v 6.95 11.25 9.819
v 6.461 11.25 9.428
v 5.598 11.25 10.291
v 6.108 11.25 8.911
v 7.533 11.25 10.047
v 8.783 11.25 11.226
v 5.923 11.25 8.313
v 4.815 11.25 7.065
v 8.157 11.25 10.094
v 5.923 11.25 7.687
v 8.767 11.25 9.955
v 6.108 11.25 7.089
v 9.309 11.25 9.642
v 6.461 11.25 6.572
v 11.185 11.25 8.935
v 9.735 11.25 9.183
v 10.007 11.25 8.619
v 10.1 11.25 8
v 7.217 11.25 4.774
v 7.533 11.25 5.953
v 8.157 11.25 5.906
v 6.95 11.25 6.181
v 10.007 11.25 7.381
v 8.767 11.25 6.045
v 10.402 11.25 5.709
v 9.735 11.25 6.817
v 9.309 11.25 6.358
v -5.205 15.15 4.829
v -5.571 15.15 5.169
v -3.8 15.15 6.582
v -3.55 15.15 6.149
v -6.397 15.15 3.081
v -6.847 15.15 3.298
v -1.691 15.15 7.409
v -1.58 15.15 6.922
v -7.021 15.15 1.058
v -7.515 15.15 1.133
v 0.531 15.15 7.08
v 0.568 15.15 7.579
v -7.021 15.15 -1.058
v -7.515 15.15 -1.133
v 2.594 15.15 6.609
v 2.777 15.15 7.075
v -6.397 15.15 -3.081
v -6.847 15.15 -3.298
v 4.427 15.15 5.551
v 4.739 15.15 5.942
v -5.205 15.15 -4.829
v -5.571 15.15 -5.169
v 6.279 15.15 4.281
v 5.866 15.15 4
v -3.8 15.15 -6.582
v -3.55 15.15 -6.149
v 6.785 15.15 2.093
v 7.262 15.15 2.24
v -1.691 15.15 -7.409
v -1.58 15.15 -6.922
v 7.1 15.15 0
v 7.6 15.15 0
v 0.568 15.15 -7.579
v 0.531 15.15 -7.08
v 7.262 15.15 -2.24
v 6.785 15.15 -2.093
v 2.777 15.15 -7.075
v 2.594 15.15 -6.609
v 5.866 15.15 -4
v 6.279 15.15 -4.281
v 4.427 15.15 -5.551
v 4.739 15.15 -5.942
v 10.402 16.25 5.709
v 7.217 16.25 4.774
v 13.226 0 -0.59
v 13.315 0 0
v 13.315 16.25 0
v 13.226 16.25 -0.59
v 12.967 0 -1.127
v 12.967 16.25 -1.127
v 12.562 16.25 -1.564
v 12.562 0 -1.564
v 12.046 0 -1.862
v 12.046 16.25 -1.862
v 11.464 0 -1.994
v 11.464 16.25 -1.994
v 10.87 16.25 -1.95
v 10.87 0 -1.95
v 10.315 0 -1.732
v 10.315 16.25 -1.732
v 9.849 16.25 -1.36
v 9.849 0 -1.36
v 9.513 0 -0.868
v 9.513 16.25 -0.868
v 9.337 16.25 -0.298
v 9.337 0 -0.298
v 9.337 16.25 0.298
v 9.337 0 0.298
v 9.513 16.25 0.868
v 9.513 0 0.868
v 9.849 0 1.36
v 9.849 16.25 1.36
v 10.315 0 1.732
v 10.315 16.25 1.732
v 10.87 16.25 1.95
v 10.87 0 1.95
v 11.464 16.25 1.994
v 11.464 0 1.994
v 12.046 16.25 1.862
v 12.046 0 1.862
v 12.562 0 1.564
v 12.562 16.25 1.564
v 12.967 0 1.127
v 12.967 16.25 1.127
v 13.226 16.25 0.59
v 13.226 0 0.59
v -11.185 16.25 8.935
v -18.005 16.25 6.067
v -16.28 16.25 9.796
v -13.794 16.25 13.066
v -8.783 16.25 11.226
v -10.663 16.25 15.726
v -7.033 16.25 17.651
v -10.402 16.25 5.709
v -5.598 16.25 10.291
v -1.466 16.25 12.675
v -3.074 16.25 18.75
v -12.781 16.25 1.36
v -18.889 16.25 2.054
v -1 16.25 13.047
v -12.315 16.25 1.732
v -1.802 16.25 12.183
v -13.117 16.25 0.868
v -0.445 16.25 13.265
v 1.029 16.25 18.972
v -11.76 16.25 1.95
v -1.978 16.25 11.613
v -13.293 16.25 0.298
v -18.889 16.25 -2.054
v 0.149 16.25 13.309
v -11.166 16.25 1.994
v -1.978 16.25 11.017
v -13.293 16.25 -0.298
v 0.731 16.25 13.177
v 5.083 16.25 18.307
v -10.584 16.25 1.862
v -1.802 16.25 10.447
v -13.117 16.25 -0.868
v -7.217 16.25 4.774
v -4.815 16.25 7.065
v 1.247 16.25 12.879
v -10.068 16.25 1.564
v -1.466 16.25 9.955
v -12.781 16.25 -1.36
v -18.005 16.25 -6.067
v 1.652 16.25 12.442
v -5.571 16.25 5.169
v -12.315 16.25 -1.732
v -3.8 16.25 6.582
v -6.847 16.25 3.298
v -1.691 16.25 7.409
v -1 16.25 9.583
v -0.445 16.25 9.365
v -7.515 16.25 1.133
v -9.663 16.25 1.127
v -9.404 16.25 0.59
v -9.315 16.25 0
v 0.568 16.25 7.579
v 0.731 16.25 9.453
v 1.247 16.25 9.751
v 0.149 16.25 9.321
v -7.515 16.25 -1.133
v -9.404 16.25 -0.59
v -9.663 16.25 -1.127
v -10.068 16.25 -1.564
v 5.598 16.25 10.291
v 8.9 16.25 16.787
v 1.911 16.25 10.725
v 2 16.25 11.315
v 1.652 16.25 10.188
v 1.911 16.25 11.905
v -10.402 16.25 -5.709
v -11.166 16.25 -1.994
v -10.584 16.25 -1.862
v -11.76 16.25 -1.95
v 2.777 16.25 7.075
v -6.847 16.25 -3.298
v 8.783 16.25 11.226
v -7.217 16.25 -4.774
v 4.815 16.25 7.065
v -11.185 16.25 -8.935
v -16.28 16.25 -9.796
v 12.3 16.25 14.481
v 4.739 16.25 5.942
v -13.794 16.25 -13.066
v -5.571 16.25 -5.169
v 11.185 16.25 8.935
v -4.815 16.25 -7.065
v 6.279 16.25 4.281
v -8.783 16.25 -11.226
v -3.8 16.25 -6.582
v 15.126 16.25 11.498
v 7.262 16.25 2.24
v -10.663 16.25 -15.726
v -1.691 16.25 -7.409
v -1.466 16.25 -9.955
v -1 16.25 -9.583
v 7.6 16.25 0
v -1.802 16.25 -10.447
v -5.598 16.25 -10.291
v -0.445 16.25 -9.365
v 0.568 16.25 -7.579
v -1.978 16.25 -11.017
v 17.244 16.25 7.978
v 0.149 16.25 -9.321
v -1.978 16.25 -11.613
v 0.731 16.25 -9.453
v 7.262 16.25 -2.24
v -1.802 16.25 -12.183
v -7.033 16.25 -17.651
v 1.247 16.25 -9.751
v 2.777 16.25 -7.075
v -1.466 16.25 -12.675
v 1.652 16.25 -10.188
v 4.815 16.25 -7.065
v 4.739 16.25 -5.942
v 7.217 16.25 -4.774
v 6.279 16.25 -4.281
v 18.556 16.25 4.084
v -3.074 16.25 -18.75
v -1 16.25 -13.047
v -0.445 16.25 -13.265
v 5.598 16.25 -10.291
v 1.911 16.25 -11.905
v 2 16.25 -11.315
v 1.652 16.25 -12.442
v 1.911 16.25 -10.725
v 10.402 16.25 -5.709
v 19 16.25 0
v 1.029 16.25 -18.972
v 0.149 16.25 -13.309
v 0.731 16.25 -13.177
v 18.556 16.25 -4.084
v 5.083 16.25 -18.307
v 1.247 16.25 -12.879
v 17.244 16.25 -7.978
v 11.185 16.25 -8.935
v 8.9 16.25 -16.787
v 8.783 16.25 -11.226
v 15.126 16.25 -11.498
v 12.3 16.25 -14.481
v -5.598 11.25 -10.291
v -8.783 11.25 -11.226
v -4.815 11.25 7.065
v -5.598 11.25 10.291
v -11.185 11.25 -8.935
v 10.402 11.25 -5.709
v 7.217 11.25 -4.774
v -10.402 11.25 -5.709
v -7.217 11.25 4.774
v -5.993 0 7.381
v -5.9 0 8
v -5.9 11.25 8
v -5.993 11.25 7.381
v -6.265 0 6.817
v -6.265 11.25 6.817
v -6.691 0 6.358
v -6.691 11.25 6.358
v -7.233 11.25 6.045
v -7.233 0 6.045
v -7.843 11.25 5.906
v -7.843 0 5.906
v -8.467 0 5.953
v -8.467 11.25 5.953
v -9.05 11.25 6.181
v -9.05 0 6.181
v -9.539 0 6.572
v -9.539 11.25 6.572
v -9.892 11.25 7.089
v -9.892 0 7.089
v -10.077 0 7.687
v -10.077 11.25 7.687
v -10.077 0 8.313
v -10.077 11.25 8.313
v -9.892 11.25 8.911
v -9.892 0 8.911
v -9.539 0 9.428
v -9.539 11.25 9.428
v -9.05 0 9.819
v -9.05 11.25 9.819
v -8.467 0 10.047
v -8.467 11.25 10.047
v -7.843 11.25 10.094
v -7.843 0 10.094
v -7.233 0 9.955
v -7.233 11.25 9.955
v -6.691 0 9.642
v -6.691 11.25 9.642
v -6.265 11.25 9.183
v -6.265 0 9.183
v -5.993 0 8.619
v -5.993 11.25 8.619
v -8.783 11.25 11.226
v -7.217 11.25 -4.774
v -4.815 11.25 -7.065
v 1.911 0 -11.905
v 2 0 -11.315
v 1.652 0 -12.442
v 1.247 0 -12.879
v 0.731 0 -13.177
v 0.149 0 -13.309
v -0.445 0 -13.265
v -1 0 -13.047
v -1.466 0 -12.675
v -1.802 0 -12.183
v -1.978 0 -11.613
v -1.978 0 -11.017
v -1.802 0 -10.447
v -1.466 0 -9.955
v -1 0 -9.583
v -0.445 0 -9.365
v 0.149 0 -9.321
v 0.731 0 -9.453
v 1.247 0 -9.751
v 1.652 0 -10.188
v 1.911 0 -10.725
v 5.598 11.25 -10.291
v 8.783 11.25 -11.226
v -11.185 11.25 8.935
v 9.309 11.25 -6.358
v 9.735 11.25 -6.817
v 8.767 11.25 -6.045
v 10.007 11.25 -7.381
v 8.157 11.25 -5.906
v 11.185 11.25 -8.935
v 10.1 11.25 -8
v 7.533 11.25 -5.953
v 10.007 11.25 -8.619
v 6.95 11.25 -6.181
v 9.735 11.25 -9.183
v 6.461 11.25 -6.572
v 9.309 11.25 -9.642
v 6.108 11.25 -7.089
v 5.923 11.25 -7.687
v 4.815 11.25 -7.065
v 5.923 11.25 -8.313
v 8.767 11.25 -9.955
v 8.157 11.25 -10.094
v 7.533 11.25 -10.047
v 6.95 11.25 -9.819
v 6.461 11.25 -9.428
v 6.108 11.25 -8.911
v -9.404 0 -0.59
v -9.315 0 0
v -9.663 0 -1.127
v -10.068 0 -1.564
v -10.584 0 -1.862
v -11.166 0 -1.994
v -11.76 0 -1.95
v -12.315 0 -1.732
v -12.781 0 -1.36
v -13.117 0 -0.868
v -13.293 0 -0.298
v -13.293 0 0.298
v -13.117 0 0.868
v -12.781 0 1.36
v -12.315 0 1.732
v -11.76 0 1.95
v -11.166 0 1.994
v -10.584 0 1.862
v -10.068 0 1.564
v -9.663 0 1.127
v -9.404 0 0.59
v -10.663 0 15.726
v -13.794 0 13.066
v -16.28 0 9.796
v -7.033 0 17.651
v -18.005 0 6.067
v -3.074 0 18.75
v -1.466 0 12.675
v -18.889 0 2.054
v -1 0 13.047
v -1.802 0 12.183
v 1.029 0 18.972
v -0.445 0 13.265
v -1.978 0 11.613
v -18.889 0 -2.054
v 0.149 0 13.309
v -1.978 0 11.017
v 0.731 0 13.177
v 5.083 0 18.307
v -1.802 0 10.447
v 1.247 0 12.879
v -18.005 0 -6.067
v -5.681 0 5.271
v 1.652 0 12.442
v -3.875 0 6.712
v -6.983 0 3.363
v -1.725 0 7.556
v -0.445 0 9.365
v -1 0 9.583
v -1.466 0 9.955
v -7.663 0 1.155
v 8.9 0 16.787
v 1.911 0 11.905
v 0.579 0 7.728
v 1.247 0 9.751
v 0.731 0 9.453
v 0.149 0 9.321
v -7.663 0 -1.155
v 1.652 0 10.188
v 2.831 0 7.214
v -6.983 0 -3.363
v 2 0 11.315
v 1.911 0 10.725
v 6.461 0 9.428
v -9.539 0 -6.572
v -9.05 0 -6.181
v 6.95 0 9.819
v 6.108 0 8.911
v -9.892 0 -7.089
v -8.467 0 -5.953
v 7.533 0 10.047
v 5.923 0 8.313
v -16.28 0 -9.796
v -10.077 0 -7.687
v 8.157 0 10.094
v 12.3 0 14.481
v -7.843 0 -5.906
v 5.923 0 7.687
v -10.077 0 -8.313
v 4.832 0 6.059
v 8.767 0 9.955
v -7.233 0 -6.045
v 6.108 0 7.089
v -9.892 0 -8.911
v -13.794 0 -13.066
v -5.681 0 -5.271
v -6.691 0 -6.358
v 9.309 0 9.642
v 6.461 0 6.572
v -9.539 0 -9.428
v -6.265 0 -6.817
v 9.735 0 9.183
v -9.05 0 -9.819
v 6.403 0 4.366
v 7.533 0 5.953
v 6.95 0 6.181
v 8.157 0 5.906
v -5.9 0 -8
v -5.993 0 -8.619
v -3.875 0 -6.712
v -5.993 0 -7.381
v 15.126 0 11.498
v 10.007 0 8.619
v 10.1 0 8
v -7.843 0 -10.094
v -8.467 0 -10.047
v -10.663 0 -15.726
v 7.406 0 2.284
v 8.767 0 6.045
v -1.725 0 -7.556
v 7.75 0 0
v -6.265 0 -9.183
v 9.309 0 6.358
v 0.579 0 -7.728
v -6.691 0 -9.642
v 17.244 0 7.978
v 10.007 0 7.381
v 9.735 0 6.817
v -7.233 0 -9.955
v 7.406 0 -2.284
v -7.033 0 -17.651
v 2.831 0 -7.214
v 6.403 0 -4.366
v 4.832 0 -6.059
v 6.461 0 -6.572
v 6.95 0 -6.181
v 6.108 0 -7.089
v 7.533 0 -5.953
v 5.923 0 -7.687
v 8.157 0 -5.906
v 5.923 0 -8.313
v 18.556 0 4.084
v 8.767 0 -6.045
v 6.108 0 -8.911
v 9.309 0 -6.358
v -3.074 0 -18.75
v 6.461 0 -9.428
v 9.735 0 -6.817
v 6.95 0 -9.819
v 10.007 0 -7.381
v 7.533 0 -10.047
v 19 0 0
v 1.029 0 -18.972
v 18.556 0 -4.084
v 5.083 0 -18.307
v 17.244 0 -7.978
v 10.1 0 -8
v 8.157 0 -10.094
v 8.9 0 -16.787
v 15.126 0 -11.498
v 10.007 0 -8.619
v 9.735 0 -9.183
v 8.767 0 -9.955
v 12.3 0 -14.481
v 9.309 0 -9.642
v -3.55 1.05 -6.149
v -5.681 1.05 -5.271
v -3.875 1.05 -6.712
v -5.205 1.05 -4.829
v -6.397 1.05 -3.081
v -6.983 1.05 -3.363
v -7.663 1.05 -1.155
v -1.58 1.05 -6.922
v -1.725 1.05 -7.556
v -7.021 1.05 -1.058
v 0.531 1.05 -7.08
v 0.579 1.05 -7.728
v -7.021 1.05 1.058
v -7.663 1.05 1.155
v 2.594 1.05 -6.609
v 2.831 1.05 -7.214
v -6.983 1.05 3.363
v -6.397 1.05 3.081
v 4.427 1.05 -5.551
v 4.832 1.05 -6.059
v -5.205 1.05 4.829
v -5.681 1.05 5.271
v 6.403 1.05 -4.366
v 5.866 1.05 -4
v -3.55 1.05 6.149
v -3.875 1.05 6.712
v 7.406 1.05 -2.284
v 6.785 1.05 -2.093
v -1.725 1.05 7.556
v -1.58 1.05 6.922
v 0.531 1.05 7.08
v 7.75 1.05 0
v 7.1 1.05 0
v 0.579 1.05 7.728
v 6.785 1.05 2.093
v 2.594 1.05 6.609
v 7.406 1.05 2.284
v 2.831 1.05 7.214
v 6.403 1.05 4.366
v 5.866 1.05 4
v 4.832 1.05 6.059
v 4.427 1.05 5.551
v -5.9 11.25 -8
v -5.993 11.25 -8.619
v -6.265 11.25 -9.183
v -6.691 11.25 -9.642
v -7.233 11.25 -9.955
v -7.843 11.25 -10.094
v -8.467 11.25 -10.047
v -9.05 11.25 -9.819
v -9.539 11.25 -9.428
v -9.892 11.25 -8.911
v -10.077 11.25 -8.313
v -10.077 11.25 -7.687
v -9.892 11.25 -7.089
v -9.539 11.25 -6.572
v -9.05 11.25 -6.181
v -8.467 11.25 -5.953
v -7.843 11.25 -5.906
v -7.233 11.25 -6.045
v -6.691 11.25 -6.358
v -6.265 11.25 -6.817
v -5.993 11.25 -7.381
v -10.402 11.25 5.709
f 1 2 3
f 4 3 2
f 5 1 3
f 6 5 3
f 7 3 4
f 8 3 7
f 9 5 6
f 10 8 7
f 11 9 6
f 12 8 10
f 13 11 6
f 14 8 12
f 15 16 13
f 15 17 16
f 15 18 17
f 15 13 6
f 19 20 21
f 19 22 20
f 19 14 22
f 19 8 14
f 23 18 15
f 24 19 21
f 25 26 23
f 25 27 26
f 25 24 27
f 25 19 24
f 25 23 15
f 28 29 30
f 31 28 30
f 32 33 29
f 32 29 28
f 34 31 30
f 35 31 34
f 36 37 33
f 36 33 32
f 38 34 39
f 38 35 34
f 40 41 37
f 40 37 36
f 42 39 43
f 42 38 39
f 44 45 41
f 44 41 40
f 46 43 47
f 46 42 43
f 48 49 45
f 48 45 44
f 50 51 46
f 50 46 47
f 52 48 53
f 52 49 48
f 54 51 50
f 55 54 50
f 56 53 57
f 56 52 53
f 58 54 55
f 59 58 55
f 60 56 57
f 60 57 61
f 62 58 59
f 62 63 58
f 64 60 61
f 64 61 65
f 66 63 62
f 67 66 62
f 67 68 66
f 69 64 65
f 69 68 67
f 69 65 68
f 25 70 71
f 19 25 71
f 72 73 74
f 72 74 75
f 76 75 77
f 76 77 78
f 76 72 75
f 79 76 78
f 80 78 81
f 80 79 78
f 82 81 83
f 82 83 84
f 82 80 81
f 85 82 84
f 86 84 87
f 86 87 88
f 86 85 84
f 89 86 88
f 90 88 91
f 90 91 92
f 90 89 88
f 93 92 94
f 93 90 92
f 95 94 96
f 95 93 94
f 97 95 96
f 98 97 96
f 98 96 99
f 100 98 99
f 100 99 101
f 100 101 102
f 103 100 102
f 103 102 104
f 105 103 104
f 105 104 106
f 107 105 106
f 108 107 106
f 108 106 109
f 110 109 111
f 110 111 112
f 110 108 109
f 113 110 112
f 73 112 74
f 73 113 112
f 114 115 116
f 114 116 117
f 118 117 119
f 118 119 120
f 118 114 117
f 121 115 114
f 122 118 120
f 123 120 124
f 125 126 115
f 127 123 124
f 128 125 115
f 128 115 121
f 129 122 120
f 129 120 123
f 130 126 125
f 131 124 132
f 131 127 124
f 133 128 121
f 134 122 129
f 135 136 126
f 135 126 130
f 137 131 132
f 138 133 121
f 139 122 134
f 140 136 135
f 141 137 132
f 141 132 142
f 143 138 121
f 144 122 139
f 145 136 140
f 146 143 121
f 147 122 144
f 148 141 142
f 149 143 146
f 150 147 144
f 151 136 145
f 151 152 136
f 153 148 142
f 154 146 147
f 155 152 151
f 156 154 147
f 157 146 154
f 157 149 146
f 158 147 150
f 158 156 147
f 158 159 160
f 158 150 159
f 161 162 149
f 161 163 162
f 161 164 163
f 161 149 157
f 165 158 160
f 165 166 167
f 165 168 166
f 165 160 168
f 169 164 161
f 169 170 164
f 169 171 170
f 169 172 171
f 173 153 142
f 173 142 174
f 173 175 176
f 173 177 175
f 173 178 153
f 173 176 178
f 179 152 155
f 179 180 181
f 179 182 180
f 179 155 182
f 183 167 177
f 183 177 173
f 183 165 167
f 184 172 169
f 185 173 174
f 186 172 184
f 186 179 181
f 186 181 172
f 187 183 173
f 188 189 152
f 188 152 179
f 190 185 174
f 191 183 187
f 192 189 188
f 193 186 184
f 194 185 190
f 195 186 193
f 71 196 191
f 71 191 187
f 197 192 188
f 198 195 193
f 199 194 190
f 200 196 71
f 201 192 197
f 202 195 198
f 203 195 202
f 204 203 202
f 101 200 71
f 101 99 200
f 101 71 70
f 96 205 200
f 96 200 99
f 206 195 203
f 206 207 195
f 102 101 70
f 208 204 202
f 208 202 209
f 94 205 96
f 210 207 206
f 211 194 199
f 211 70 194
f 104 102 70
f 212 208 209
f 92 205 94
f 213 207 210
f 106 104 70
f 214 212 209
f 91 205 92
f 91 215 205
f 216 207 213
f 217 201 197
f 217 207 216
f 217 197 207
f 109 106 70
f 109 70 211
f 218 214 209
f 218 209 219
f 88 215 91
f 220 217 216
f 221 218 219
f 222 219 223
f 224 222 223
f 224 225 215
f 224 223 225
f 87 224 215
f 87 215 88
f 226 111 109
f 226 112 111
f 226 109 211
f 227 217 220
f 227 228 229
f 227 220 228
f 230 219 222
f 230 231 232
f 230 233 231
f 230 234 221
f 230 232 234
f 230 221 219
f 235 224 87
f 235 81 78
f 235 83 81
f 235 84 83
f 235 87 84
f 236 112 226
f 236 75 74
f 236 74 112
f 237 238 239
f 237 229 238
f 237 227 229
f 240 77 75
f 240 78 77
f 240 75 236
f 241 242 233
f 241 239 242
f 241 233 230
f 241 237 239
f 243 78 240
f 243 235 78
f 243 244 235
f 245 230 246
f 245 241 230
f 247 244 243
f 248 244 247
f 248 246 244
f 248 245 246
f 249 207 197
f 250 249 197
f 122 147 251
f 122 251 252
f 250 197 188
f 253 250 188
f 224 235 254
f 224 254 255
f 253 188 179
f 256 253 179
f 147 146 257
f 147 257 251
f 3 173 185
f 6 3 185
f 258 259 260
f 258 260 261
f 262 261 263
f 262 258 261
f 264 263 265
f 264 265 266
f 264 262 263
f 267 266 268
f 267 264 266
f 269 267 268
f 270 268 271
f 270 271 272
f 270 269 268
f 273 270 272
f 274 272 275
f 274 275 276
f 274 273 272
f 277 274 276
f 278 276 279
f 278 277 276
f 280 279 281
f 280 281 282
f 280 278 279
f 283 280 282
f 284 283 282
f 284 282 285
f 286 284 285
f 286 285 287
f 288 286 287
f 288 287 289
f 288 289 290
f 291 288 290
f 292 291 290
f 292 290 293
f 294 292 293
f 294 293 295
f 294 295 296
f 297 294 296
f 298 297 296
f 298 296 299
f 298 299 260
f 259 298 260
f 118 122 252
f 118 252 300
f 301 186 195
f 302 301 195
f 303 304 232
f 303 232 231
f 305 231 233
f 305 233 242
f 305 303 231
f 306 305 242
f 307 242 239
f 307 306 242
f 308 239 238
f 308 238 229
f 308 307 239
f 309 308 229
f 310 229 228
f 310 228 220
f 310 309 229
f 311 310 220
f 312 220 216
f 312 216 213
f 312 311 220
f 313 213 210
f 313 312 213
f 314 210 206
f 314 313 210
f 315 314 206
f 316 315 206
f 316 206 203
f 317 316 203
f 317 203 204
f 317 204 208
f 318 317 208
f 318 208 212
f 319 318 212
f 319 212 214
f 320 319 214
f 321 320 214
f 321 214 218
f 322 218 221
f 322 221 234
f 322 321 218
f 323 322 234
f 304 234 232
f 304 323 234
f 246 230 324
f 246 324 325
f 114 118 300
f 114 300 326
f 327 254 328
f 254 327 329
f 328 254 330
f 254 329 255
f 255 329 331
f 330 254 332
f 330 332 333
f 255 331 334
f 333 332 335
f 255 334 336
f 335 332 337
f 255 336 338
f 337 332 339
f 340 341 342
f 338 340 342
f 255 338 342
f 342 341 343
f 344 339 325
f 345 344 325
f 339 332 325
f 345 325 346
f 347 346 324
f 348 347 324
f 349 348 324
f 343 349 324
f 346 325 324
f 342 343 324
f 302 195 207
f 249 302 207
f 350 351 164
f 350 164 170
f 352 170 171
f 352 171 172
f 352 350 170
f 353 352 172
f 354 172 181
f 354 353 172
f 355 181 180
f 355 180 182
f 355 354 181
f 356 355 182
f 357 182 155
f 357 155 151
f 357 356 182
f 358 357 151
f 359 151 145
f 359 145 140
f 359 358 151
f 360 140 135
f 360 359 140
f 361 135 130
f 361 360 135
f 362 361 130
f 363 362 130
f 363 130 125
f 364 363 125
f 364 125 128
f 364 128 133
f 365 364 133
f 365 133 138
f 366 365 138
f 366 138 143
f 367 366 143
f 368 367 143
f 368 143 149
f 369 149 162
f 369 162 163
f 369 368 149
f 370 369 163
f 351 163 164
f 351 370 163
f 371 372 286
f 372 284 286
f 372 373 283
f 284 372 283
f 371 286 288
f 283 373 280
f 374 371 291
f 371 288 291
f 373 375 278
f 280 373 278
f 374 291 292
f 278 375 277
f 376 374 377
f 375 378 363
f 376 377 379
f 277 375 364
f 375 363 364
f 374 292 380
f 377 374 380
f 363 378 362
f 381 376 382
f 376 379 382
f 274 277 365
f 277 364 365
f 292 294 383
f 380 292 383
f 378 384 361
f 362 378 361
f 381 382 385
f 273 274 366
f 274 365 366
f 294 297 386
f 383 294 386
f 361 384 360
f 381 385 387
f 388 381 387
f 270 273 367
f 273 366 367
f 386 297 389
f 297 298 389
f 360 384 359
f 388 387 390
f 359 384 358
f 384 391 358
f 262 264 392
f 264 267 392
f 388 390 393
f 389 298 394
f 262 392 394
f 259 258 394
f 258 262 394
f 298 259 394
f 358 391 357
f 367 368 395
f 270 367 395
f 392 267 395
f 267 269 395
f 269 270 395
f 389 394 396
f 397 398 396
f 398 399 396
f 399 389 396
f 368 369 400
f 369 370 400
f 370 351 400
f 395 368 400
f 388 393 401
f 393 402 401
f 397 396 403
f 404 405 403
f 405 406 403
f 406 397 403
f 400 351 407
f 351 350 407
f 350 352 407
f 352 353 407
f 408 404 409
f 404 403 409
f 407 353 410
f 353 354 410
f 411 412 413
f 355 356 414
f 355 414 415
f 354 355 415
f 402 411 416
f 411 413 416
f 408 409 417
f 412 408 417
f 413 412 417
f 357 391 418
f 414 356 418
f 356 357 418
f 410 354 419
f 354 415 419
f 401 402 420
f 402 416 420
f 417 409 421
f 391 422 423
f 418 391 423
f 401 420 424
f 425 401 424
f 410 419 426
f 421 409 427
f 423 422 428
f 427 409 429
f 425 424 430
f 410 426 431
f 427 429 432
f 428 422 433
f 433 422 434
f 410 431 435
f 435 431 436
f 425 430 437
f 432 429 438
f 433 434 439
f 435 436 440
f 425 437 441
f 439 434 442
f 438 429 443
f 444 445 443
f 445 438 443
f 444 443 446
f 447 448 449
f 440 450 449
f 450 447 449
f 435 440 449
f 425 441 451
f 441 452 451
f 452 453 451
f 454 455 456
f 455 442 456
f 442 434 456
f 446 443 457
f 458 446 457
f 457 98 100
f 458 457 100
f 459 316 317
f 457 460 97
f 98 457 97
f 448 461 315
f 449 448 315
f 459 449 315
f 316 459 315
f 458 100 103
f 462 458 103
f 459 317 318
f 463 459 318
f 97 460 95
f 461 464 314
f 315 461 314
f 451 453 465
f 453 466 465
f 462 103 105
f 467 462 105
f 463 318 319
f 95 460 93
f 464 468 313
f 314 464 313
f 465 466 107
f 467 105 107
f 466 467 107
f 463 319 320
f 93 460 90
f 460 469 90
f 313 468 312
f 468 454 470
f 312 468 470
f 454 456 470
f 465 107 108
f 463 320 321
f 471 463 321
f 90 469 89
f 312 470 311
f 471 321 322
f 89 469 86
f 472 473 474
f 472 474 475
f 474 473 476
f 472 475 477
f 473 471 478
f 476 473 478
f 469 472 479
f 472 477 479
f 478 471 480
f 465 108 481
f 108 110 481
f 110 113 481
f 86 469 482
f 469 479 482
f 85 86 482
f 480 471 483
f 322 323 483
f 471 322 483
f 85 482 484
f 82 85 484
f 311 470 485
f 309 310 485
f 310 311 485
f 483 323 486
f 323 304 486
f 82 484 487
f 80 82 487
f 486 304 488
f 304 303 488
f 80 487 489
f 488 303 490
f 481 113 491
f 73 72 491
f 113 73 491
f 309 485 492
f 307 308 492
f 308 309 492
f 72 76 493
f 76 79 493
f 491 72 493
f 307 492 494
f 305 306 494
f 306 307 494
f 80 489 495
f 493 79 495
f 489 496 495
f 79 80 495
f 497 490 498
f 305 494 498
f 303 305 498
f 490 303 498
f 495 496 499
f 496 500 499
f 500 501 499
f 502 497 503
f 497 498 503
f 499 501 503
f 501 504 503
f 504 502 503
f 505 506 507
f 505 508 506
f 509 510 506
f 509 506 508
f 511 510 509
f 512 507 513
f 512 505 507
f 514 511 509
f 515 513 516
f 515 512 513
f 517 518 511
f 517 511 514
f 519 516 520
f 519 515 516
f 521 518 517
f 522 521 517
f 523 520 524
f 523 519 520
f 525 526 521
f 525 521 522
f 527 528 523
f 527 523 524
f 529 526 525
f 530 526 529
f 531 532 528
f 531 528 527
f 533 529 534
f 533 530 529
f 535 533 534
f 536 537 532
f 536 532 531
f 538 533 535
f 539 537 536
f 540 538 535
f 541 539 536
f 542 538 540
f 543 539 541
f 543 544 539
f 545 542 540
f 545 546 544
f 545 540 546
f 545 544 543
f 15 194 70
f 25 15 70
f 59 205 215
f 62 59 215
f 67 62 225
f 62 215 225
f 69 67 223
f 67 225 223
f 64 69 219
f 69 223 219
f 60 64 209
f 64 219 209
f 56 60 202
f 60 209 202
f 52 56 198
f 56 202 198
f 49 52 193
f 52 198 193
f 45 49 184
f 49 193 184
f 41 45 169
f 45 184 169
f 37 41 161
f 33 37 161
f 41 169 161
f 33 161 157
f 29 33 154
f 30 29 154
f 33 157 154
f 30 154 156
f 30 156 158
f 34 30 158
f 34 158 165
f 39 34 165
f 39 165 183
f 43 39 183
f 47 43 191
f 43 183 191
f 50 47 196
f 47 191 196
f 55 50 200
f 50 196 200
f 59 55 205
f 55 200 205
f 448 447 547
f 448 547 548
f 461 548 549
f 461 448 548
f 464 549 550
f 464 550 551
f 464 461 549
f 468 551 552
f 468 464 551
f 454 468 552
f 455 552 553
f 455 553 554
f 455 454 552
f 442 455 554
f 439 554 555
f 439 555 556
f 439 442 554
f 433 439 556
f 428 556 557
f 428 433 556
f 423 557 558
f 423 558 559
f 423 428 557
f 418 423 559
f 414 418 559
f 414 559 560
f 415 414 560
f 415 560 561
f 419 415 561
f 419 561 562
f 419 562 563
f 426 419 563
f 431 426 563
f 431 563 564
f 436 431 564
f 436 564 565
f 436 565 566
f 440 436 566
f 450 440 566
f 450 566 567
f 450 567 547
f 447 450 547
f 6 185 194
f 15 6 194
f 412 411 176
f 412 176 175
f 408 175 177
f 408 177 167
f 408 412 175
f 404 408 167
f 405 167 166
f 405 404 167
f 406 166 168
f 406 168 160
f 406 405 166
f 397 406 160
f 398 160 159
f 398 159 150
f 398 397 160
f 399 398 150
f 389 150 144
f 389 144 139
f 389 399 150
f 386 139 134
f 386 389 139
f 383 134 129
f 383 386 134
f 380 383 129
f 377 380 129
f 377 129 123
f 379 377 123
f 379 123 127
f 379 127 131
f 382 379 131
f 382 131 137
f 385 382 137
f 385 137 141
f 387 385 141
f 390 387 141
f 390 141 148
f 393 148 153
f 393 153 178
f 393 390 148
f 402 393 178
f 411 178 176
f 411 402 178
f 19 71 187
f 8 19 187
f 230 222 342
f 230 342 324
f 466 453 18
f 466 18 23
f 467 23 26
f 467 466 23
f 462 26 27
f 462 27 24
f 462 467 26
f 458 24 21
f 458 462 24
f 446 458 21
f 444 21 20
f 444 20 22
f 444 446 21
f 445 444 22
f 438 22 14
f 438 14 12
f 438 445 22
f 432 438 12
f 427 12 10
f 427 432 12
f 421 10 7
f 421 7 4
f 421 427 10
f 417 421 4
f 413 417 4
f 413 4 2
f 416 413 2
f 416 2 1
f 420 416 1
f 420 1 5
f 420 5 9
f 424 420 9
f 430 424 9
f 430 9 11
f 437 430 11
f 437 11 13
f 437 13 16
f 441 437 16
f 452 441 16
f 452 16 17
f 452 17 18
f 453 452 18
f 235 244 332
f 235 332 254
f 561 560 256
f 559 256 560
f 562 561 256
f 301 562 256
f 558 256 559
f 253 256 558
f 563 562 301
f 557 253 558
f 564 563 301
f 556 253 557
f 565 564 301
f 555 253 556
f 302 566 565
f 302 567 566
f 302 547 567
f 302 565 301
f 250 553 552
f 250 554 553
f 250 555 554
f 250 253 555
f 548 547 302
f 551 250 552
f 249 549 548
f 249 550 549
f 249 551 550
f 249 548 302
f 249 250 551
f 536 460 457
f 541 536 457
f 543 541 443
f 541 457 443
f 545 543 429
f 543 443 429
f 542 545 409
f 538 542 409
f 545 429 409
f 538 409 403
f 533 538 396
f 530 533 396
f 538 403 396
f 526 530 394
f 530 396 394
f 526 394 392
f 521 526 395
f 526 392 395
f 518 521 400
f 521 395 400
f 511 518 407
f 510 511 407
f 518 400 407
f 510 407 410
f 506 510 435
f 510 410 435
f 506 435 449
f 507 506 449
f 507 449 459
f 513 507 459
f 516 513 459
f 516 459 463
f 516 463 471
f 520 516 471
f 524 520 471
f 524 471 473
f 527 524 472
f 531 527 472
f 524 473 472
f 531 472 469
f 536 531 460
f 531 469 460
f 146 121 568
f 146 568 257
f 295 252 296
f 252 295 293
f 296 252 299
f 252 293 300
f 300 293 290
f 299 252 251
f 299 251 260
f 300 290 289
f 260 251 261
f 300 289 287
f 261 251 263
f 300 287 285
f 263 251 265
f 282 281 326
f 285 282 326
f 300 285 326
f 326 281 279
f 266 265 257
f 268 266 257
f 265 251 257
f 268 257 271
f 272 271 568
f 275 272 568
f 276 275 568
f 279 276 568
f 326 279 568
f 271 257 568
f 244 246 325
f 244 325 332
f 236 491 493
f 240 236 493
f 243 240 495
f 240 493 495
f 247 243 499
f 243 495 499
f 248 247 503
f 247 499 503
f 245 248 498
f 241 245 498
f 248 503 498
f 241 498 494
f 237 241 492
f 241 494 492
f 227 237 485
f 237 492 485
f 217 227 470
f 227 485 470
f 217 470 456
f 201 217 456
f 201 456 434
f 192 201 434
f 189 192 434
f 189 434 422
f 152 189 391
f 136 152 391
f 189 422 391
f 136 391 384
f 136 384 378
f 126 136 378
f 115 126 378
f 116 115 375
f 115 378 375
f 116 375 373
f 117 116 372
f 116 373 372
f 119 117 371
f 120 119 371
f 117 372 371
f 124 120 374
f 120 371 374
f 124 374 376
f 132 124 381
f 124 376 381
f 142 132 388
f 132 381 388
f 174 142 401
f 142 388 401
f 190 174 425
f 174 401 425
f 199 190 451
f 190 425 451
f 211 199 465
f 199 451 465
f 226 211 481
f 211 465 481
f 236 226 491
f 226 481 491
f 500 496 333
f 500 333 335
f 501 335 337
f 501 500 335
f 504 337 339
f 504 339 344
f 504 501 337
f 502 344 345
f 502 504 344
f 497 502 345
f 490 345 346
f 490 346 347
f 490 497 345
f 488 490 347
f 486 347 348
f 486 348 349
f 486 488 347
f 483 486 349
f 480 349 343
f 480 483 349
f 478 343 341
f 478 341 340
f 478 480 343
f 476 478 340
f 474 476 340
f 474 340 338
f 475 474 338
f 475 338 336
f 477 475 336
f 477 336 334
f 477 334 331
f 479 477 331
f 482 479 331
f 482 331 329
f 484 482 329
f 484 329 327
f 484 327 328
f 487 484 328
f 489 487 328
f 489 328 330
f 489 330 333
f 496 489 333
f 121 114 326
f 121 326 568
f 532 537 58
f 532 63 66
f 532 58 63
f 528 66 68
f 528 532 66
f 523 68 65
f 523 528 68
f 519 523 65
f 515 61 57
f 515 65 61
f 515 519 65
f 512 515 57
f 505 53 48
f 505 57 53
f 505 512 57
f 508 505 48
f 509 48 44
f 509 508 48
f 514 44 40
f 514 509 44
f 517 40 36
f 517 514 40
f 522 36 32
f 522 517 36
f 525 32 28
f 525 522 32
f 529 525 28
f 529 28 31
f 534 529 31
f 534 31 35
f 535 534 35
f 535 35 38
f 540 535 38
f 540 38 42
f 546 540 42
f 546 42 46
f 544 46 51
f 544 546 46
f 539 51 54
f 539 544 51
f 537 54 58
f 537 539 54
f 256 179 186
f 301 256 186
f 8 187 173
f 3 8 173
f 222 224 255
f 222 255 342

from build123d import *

# Parameters (mm, degrees)
SKETCH1_R           = 19
SKETCH1_R_2         = 2.1
SKETCH1_R_3         = 7.1
SKETCH1_R_4         = 2
BOSS_EXTRUDE1_DEPTH = 16.25
SKETCH2_R           = 7.6
CUT_EXTRUDE1_DEPTH  = 1.1
SKETCH3_R           = 7.75
CUT_EXTRUDE2_DEPTH  = 1.05
SKETCH4_R           = 2.1
CUT_EXTRUDE3_DEPTH  = 5


with BuildPart() as part:
    # Sketch1 → Boss-Extrude1 (new body)
    with BuildSketch(Plane(origin=(0, 0, 0), x_dir=(1, 0, 0), z_dir=(0, 1, 0))):
        Circle(SKETCH1_R)
        with Locations((-8, 8)):
            Circle(SKETCH1_R_2, mode=Mode.SUBTRACT)
        with Locations((-8, -8)):
            Circle(SKETCH1_R_2, mode=Mode.SUBTRACT)
        with Locations((8, 8)):
            Circle(SKETCH1_R_2, mode=Mode.SUBTRACT)
        with Locations((8, -8)):
            Circle(SKETCH1_R_2, mode=Mode.SUBTRACT)
        Circle(SKETCH1_R_3, mode=Mode.SUBTRACT)
        with Locations((0, 11.315)):
            Circle(SKETCH1_R_4, mode=Mode.SUBTRACT)
        with Locations((11.315, 0)):
            Circle(SKETCH1_R_4, mode=Mode.SUBTRACT)
        with Locations((0, -11.315)):
            Circle(SKETCH1_R_4, mode=Mode.SUBTRACT)
        with Locations((-11.315, 0)):
            Circle(SKETCH1_R_4, mode=Mode.SUBTRACT)
    extrude(amount=BOSS_EXTRUDE1_DEPTH)

    # Sketch2 → Cut-Extrude1 (cut)
    with BuildSketch(Plane(origin=(0, 16.25, 0), x_dir=(1, 0, 0), z_dir=(0, 1, 0))):
        Circle(SKETCH2_R)
    extrude(amount=-CUT_EXTRUDE1_DEPTH, mode=Mode.SUBTRACT)

    # Sketch3 → Cut-Extrude2 (cut)
    with BuildSketch(Plane.XZ):
        Circle(SKETCH3_R)
    extrude(amount=-CUT_EXTRUDE2_DEPTH, mode=Mode.SUBTRACT)

    # Sketch4 → Cut-Extrude3 (cut)
    with BuildSketch(Plane(origin=(0, 16.25, 0), x_dir=(1, 0, 0), z_dir=(0, 1, 0))):
        Polygon((-11.185438763, 8.934779773), (-10.402262411, 5.708718996), (-7.216823649, 4.773939223), (-4.814561237, 7.065220227), (-5.597737589, 10.291281004), (-8.783176351, 11.226060777), align=None)
        with Locations((-8, 8)):
            Circle(SKETCH4_R, mode=Mode.SUBTRACT)
        Polygon((7.216823649, 4.773939223), (4.814561237, 7.065220227), (5.597737589, 10.291281004), (8.783176351, 11.226060777), (11.185438763, 8.934779773), (10.402262411, 5.708718996), align=None)
        with Locations((8, 8)):
            Circle(SKETCH4_R, mode=Mode.SUBTRACT)
        Polygon((-7.216823649, -4.773939223), (-4.814561237, -7.065220227), (-5.597737589, -10.291281004), (-8.783176351, -11.226060777), (-11.185438763, -8.934779773), (-10.402262411, -5.708718996), align=None)
        with Locations((-8, -8)):
            Circle(SKETCH4_R, mode=Mode.SUBTRACT)
        Polygon((11.185438763, -8.934779773), (10.402262411, -5.708718996), (7.216823649, -4.773939223), (4.814561237, -7.065220227), (5.597737589, -10.291281004), (8.783176351, -11.226060777), align=None)
        with Locations((8, -8)):
            Circle(SKETCH4_R, mode=Mode.SUBTRACT)
    extrude(amount=-CUT_EXTRUDE3_DEPTH, mode=Mode.SUBTRACT)


solid = part.part
